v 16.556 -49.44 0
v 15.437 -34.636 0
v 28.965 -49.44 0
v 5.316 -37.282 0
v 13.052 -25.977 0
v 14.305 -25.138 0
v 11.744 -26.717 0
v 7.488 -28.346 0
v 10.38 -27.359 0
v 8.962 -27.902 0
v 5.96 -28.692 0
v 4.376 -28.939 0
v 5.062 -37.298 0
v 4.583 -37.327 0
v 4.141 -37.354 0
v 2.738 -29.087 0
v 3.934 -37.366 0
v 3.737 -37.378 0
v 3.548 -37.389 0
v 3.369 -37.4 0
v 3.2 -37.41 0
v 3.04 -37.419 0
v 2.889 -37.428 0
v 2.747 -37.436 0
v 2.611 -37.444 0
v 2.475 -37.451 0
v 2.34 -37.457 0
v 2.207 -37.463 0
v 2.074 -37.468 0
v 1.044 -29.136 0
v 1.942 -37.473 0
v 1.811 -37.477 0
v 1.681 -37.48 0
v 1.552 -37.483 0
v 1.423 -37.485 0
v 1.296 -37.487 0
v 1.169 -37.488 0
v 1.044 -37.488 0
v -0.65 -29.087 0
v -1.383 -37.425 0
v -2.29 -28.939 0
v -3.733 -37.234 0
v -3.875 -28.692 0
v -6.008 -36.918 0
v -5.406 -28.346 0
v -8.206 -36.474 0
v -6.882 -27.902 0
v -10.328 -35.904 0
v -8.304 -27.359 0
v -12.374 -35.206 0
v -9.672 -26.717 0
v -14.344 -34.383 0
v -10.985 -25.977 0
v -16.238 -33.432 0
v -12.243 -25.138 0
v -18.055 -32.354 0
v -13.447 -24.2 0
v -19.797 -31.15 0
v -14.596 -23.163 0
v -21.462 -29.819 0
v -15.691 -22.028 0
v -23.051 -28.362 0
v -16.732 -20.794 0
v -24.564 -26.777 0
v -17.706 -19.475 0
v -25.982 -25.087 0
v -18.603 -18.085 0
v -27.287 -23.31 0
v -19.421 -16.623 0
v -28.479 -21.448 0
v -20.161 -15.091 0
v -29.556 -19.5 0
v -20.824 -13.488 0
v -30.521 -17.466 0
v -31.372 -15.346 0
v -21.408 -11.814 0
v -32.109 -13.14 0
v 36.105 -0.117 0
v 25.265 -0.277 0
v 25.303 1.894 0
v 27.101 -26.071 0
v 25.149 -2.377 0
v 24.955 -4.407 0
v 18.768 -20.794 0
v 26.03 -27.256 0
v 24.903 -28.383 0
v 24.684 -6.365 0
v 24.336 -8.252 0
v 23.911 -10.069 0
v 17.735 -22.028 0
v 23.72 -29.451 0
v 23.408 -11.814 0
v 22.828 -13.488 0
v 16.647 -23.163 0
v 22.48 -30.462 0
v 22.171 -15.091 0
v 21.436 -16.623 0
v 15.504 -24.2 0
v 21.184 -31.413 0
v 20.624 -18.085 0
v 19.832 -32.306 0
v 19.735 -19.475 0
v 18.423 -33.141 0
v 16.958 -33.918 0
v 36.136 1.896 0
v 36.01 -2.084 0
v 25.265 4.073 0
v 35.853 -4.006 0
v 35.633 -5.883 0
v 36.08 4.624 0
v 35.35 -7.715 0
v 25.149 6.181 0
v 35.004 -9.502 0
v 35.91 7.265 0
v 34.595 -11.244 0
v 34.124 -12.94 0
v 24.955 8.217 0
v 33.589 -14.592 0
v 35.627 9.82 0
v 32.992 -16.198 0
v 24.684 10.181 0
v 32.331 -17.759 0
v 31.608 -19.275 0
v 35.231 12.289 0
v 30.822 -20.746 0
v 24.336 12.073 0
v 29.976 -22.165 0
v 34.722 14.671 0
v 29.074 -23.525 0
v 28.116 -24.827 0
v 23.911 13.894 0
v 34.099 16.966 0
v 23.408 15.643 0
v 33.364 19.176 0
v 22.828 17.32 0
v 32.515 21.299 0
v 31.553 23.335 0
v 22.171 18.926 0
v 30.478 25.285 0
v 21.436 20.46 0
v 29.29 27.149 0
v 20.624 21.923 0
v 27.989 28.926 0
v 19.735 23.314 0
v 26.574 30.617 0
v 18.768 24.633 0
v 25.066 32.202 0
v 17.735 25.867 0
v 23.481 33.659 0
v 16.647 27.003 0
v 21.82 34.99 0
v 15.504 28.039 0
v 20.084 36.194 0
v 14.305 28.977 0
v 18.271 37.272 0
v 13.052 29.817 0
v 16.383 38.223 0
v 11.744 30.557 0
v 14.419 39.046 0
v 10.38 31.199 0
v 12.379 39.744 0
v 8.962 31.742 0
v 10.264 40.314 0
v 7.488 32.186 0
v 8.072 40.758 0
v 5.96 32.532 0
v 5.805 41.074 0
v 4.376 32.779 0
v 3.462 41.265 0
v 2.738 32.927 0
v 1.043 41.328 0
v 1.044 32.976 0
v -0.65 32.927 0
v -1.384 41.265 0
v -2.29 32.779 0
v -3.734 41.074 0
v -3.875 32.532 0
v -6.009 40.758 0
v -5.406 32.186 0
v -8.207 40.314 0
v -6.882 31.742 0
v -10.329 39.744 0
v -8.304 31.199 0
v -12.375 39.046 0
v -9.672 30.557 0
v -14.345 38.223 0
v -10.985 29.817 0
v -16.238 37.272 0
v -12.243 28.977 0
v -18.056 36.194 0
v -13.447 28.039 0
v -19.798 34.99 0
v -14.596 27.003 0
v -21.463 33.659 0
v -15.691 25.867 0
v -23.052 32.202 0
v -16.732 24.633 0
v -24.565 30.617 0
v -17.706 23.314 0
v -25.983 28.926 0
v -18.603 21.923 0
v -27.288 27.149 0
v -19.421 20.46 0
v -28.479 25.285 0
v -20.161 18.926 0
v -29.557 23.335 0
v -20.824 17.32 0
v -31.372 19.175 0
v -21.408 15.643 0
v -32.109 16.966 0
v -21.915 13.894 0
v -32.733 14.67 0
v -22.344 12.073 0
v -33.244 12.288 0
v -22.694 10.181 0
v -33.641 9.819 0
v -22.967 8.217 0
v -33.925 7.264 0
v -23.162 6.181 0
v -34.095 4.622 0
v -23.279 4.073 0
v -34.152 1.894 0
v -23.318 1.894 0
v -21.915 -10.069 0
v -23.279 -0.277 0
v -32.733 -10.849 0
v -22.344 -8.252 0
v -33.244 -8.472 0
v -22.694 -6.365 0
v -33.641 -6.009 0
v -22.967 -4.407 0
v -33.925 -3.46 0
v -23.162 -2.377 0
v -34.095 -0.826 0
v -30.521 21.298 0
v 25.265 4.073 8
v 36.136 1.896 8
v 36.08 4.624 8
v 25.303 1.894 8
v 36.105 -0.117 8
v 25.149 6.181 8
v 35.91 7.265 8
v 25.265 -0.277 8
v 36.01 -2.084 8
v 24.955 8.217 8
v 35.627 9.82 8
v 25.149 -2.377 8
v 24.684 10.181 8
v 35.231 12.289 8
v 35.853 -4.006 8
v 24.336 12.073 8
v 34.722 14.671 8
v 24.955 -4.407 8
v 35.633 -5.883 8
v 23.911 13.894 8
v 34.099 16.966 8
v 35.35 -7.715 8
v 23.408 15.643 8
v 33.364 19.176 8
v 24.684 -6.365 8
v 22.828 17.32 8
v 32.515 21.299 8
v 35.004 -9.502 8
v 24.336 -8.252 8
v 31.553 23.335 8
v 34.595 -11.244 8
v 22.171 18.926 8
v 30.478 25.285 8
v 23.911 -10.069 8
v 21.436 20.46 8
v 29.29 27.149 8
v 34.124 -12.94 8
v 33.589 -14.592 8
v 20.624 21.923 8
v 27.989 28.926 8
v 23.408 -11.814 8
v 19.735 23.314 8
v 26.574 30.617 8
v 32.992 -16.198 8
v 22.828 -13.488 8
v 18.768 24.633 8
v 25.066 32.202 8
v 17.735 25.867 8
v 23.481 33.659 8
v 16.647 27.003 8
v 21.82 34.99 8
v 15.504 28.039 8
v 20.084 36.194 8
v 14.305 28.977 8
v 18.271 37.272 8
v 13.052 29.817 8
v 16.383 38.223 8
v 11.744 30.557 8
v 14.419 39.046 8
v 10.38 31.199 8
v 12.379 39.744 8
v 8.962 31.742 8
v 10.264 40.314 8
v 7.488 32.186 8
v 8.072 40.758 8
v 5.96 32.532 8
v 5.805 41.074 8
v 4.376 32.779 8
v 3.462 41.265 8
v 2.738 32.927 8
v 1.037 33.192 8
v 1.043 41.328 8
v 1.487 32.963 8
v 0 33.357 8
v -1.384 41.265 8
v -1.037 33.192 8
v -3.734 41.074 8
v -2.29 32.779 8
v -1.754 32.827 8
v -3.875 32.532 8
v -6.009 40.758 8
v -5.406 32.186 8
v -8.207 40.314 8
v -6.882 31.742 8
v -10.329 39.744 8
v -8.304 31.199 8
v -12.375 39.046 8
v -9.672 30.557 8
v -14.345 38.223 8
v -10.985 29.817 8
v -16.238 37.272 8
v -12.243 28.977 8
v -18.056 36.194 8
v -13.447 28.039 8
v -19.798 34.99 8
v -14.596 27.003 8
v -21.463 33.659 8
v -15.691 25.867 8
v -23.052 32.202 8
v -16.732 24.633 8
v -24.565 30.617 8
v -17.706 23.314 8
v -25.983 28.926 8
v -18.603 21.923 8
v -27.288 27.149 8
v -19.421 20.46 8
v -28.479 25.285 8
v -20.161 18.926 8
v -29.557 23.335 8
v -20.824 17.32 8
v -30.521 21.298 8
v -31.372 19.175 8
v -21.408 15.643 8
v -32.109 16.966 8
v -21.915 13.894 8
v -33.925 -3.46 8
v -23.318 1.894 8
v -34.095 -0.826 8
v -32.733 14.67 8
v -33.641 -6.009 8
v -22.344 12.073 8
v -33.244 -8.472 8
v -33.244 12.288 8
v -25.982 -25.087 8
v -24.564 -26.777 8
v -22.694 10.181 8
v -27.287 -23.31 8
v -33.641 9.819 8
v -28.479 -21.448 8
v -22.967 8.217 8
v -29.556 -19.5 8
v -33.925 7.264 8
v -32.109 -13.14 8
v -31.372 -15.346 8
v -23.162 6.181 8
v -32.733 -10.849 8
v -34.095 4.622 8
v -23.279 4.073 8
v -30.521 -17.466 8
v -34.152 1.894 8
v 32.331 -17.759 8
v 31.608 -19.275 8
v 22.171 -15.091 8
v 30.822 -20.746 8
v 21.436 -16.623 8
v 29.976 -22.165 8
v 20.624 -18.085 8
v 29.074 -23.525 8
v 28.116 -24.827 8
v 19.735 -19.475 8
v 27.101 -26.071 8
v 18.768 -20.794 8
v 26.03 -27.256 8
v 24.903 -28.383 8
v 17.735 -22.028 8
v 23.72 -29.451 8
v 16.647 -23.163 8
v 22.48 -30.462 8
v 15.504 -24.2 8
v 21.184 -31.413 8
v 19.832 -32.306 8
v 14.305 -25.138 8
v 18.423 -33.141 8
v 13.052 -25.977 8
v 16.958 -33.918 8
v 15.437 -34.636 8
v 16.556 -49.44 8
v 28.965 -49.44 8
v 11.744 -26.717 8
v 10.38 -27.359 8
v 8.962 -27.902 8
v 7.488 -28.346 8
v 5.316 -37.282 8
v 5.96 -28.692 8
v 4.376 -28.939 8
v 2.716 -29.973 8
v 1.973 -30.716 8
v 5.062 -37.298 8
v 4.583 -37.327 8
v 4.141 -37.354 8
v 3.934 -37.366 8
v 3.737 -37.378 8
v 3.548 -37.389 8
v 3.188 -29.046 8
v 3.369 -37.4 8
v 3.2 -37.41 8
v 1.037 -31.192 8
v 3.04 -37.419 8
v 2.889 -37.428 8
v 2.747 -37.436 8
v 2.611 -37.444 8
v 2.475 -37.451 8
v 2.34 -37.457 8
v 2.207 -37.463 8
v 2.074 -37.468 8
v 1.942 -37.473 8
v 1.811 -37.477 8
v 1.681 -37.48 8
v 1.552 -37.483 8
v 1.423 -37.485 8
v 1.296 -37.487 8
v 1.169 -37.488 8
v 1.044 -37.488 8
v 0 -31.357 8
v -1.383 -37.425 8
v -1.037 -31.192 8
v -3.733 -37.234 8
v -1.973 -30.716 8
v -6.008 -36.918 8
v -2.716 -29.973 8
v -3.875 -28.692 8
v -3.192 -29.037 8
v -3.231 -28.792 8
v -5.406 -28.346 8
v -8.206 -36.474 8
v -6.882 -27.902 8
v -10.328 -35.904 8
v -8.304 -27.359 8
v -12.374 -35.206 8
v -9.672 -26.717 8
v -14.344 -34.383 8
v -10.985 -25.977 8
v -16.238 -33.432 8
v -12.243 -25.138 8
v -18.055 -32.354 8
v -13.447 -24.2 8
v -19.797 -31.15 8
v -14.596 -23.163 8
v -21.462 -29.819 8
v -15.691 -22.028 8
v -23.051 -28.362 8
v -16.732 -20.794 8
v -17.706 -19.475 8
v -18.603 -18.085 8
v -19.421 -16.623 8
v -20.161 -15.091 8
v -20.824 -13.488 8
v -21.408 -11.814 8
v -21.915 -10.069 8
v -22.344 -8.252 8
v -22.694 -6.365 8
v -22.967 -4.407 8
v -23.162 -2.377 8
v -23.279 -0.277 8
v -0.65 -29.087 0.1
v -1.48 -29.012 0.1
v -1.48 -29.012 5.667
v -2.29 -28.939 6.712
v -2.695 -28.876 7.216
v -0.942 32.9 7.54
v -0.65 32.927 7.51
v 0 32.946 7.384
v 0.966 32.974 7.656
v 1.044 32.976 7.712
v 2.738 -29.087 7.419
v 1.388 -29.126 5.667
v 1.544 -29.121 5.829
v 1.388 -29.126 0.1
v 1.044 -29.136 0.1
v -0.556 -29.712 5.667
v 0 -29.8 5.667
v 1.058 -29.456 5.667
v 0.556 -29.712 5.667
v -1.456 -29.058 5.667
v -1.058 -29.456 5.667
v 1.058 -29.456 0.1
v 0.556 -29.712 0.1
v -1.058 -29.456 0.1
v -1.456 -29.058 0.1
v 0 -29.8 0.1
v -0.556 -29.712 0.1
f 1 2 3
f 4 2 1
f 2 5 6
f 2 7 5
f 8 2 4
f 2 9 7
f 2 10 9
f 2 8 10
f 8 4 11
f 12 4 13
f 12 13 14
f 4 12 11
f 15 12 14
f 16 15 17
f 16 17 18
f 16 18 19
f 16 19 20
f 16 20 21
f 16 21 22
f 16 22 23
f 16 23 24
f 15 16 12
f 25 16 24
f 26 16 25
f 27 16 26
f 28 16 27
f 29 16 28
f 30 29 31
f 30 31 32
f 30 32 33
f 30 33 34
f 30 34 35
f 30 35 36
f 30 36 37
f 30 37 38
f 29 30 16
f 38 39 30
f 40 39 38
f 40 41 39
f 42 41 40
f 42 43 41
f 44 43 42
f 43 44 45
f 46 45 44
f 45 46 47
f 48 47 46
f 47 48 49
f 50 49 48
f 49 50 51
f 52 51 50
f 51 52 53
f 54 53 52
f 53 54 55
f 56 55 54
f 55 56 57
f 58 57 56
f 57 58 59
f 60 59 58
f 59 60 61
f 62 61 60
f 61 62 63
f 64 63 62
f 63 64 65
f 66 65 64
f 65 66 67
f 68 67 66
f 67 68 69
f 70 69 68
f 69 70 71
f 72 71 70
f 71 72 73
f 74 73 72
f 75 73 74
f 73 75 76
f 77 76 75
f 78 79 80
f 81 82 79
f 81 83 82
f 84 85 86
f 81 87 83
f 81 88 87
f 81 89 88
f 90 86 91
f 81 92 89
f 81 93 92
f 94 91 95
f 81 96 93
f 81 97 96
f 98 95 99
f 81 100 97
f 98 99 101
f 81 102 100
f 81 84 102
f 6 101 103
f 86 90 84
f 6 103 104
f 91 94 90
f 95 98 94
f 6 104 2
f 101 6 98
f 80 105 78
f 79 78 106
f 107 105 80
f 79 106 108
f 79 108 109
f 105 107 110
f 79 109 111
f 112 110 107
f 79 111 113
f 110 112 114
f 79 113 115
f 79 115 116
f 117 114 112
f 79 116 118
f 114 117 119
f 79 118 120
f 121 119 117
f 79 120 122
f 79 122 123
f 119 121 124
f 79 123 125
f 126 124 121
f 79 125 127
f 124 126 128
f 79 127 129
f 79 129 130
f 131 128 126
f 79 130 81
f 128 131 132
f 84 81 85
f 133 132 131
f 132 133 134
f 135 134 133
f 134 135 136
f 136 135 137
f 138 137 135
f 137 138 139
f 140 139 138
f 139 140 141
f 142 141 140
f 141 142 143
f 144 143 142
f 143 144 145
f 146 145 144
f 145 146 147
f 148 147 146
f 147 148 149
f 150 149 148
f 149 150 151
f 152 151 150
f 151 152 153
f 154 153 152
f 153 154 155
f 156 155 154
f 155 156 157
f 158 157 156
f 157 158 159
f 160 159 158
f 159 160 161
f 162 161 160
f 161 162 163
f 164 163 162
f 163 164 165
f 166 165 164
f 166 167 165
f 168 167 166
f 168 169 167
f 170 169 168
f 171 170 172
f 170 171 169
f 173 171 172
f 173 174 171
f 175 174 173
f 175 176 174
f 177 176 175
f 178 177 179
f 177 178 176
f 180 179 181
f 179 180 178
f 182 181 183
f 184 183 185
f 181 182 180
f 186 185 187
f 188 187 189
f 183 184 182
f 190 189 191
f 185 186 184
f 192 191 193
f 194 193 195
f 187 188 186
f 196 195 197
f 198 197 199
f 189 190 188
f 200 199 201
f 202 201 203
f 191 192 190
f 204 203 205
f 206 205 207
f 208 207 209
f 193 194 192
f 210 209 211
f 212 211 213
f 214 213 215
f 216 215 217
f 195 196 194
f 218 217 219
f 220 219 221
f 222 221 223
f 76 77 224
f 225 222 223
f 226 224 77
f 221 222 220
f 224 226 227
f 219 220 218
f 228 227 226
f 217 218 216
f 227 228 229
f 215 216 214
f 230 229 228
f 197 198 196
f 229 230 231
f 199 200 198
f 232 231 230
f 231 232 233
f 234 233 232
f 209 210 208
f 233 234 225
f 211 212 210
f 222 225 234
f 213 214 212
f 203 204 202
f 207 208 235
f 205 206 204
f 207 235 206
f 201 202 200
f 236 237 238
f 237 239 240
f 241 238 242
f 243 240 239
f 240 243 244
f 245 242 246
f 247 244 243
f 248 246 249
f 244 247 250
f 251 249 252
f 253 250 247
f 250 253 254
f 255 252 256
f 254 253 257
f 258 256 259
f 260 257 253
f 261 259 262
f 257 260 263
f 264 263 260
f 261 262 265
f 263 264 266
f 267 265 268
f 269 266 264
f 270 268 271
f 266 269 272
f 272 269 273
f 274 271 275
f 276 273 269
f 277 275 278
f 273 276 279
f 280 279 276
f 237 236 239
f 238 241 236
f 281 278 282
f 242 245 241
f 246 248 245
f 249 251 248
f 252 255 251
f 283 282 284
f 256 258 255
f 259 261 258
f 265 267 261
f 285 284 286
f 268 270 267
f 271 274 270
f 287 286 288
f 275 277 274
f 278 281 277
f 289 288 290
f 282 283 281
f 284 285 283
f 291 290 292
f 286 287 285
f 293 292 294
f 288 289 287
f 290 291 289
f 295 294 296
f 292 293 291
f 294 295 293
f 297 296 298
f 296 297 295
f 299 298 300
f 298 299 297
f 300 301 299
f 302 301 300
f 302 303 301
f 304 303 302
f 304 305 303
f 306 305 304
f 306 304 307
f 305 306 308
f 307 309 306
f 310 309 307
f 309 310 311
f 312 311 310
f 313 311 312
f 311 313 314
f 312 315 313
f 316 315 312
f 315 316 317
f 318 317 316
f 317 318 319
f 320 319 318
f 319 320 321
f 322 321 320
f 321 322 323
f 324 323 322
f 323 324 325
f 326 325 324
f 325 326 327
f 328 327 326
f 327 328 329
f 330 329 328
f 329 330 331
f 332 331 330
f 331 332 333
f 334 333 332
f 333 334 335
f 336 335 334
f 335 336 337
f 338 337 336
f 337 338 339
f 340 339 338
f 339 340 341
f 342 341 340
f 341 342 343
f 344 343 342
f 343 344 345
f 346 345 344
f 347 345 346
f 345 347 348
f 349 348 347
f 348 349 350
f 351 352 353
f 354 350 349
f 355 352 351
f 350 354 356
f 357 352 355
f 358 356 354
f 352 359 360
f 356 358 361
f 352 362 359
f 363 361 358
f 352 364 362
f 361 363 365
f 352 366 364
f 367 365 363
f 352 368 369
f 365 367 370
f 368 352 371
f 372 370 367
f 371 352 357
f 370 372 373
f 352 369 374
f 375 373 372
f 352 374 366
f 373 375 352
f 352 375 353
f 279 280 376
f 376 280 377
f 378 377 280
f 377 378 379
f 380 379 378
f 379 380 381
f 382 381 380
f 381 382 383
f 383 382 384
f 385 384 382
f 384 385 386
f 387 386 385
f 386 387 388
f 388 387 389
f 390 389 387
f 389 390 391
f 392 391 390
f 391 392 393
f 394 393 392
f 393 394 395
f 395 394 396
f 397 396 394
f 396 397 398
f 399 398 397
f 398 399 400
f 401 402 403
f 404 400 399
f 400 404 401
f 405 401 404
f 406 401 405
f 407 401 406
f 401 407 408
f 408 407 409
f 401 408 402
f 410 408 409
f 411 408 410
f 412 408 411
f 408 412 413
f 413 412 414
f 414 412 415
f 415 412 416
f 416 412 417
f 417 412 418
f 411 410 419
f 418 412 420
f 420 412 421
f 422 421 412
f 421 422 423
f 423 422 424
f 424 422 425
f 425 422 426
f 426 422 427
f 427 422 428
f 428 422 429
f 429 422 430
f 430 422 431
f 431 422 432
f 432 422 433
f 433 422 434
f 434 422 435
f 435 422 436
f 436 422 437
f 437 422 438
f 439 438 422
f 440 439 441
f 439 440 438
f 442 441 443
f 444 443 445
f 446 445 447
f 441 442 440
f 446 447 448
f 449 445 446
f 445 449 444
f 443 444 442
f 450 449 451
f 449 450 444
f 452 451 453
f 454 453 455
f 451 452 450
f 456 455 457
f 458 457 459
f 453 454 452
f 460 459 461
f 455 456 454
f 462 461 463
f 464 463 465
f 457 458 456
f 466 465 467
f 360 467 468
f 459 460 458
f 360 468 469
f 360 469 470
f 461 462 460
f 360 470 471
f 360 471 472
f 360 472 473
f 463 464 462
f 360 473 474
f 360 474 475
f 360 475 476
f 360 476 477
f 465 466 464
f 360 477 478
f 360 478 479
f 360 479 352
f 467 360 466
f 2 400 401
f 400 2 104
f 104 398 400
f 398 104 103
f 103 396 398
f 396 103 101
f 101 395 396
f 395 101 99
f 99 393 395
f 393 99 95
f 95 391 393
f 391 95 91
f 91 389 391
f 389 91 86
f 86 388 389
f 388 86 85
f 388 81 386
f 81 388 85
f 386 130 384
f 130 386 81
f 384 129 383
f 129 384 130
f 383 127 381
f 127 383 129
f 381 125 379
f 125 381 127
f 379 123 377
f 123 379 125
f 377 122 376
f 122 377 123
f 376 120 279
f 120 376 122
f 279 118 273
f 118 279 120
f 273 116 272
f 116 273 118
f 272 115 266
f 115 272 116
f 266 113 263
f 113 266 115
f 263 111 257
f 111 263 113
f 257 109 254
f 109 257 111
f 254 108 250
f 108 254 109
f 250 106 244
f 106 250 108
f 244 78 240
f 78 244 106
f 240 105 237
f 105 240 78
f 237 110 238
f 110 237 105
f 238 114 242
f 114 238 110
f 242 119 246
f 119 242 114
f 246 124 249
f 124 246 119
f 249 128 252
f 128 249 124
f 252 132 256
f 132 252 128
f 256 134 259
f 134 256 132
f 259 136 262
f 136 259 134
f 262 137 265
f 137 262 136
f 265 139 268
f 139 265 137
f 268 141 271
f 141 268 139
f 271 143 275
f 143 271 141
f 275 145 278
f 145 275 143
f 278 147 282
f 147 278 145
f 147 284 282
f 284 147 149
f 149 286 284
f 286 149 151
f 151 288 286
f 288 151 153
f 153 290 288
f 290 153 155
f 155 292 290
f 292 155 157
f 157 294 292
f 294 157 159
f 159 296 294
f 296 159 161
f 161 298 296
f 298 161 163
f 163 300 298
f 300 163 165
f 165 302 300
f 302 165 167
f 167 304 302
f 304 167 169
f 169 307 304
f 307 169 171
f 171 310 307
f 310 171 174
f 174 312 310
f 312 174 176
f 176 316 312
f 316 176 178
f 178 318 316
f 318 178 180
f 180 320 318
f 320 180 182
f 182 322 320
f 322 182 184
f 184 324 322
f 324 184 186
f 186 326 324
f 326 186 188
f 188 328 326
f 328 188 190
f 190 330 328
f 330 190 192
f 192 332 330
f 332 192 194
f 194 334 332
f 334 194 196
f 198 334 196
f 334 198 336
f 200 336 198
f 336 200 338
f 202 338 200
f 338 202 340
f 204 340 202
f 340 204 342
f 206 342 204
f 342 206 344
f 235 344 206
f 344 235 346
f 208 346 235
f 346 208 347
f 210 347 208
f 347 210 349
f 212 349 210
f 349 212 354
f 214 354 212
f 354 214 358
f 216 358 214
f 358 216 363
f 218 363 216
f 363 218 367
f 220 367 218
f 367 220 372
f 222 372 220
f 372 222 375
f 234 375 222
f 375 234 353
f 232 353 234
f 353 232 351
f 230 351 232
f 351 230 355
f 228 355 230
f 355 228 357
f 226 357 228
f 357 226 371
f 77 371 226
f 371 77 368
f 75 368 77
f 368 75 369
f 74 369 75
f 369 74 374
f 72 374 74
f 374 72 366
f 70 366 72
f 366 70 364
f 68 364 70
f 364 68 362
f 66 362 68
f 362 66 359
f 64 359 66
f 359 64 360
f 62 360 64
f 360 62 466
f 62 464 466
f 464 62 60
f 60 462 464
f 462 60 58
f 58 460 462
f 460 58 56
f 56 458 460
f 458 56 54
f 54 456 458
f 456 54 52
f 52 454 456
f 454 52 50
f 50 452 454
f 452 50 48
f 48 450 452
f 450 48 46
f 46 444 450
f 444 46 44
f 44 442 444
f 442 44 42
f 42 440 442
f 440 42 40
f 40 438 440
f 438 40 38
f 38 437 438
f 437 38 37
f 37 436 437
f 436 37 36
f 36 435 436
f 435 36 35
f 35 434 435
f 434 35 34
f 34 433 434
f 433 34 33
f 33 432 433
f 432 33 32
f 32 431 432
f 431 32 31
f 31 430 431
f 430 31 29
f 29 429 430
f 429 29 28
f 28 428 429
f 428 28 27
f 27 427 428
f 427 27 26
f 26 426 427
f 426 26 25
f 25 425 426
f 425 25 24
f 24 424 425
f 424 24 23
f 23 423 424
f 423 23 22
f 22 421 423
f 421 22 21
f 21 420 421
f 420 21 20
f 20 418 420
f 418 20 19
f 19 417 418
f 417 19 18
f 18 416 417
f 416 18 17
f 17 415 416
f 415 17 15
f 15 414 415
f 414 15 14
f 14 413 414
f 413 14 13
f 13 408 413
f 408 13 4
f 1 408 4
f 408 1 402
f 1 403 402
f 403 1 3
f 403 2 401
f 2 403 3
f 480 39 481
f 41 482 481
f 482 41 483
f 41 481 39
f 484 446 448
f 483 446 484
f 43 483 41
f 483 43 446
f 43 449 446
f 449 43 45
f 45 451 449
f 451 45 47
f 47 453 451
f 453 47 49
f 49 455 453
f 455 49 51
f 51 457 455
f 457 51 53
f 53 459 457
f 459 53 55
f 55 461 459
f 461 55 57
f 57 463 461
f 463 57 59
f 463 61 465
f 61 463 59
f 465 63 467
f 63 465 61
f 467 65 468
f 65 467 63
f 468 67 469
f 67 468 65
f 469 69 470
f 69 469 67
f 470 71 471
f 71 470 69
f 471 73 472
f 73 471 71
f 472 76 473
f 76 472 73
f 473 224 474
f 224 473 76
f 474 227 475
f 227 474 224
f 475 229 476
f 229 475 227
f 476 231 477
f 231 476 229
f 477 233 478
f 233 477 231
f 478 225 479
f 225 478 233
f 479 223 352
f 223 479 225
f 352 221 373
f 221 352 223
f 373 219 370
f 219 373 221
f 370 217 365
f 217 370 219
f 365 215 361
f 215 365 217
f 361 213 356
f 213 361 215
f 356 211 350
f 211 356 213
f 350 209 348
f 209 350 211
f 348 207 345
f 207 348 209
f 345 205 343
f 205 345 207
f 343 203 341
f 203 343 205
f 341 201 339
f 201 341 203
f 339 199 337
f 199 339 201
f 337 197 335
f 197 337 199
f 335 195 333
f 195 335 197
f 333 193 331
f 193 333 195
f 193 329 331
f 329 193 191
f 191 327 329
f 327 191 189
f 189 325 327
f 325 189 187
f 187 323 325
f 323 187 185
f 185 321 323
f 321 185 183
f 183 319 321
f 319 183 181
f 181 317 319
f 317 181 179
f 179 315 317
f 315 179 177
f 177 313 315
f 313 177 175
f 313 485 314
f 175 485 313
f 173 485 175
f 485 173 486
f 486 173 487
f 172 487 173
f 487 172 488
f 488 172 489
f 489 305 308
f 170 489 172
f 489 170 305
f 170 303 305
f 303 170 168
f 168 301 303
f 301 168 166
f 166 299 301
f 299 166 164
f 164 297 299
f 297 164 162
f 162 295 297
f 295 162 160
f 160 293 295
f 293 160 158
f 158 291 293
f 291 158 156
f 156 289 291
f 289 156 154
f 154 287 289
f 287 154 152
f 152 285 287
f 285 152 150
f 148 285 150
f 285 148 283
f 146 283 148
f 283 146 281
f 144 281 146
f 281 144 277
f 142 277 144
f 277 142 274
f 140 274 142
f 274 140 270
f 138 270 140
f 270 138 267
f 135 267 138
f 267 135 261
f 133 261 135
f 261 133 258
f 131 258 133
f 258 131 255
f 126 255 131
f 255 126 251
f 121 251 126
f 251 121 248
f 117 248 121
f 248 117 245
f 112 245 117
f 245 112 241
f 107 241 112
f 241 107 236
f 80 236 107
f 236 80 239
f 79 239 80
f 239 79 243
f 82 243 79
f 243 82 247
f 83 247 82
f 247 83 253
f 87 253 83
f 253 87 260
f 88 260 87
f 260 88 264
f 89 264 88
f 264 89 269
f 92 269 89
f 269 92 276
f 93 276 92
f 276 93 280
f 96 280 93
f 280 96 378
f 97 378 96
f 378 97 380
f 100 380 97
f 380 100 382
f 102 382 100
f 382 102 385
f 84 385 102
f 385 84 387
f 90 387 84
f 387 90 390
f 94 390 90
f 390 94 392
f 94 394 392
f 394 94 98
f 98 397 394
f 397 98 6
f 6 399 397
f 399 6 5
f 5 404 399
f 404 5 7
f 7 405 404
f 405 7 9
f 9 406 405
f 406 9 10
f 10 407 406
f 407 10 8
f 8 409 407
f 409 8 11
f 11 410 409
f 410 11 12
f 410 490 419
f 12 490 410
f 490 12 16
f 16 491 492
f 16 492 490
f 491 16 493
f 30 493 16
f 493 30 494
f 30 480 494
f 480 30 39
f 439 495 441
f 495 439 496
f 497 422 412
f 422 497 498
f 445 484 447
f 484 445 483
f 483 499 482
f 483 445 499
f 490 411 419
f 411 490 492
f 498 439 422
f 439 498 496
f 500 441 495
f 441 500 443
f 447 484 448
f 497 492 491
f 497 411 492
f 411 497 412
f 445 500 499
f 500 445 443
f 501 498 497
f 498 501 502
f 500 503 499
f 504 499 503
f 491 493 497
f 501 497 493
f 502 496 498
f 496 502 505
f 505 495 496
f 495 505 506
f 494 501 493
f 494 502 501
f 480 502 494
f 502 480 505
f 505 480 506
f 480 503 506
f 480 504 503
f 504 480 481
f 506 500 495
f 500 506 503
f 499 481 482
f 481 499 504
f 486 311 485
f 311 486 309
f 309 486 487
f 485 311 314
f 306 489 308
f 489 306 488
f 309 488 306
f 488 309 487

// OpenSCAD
// Street Numbers for 3D printing
// Charles Tilford, 2019
// License: CC BY-NC-SA 4.0
//   https://creativecommons.org/licenses/by-nc-sa/4.0/

char="Q";     // The number/letter to print

// Units are in mm, except for height of letter

// How many inches high should letter be?
inchesHigh=3;
// How thick/deep should letter be (mm)?
depth=8;

// Character coordinates just center the letter
charX=-40;    // Character X coord
charY=-36;    // Character Y coord
topScrew=30;  // Top screw Y coord
botScrew=-28; // Bottom screw Y coord
height=8;     // Thickness of character
// Screw dimensions. Default presumes
// #6 sheet metal screw
screwWid=3.6; // Width of screw shaft
screwTop=6.78;// Width of screw head
screwCon=5.08;// Height of head 'cone'

// Font to print in. Your system needs this
// installed, of course. If changed the hole
// positions almost certainly need to be
// changed, and maybe charX/charY.
fName="Open Sans Extrabold";
// https://fonts.google.com/specimen/Open+Sans
// Designer: Steve Matteson

// Thin floor below holes. My printer was
// struggling to have the hole 'border' stick
// to the stage. Just drill/screw thru it.
holeFloor=0.1; 

// ==========================================
// ===== All values below are auto-calculated
// ==========================================

// Scaled values
scaleFactor=inchesHigh / 3;
cX=charX * scaleFactor;
cY=charY * scaleFactor;
tS=topScrew * scaleFactor;
bS=botScrew * scaleFactor;
// Where do we start drawing screw head cone?
oS=depth - (screwCon-.05);

difference() {
  // We use difference() to punch out the screw holes
  // in the character
    
  // The character itself, 8mm thick
  translate([cX,cY,0])
    linear_extrude(height=depth, scale=1)
    text(char, size=(75*scaleFactor),
         $fn=100, font=fName);
    
  // Bottom screw hole
  translate([0,bS,oS]) color("red")
    cylinder(h=screwCon, d2=screwTop,
             d1=0, $fn=20);
   translate([0,bS,holeFloor])
    cylinder(h=20, d=screwWid, $fn=20);
    
  // Top screw hole
  translate([0,tS,oS]) color("red")
    cylinder(h=screwCon, d2=screwTop,
             d1=0, $fn=20);
  translate([0,tS,holeFloor])
    cylinder(h=20, d=screwWid, $fn=20);
}

// Colors are just to aid visualization of
// void spaces. $fn is "featuer number", ie how
// many polygons are devoted to object. The values
// above should be near your printing limit anyway.

// Developed in OpenSCAD
//    https://www.openscad.org/
